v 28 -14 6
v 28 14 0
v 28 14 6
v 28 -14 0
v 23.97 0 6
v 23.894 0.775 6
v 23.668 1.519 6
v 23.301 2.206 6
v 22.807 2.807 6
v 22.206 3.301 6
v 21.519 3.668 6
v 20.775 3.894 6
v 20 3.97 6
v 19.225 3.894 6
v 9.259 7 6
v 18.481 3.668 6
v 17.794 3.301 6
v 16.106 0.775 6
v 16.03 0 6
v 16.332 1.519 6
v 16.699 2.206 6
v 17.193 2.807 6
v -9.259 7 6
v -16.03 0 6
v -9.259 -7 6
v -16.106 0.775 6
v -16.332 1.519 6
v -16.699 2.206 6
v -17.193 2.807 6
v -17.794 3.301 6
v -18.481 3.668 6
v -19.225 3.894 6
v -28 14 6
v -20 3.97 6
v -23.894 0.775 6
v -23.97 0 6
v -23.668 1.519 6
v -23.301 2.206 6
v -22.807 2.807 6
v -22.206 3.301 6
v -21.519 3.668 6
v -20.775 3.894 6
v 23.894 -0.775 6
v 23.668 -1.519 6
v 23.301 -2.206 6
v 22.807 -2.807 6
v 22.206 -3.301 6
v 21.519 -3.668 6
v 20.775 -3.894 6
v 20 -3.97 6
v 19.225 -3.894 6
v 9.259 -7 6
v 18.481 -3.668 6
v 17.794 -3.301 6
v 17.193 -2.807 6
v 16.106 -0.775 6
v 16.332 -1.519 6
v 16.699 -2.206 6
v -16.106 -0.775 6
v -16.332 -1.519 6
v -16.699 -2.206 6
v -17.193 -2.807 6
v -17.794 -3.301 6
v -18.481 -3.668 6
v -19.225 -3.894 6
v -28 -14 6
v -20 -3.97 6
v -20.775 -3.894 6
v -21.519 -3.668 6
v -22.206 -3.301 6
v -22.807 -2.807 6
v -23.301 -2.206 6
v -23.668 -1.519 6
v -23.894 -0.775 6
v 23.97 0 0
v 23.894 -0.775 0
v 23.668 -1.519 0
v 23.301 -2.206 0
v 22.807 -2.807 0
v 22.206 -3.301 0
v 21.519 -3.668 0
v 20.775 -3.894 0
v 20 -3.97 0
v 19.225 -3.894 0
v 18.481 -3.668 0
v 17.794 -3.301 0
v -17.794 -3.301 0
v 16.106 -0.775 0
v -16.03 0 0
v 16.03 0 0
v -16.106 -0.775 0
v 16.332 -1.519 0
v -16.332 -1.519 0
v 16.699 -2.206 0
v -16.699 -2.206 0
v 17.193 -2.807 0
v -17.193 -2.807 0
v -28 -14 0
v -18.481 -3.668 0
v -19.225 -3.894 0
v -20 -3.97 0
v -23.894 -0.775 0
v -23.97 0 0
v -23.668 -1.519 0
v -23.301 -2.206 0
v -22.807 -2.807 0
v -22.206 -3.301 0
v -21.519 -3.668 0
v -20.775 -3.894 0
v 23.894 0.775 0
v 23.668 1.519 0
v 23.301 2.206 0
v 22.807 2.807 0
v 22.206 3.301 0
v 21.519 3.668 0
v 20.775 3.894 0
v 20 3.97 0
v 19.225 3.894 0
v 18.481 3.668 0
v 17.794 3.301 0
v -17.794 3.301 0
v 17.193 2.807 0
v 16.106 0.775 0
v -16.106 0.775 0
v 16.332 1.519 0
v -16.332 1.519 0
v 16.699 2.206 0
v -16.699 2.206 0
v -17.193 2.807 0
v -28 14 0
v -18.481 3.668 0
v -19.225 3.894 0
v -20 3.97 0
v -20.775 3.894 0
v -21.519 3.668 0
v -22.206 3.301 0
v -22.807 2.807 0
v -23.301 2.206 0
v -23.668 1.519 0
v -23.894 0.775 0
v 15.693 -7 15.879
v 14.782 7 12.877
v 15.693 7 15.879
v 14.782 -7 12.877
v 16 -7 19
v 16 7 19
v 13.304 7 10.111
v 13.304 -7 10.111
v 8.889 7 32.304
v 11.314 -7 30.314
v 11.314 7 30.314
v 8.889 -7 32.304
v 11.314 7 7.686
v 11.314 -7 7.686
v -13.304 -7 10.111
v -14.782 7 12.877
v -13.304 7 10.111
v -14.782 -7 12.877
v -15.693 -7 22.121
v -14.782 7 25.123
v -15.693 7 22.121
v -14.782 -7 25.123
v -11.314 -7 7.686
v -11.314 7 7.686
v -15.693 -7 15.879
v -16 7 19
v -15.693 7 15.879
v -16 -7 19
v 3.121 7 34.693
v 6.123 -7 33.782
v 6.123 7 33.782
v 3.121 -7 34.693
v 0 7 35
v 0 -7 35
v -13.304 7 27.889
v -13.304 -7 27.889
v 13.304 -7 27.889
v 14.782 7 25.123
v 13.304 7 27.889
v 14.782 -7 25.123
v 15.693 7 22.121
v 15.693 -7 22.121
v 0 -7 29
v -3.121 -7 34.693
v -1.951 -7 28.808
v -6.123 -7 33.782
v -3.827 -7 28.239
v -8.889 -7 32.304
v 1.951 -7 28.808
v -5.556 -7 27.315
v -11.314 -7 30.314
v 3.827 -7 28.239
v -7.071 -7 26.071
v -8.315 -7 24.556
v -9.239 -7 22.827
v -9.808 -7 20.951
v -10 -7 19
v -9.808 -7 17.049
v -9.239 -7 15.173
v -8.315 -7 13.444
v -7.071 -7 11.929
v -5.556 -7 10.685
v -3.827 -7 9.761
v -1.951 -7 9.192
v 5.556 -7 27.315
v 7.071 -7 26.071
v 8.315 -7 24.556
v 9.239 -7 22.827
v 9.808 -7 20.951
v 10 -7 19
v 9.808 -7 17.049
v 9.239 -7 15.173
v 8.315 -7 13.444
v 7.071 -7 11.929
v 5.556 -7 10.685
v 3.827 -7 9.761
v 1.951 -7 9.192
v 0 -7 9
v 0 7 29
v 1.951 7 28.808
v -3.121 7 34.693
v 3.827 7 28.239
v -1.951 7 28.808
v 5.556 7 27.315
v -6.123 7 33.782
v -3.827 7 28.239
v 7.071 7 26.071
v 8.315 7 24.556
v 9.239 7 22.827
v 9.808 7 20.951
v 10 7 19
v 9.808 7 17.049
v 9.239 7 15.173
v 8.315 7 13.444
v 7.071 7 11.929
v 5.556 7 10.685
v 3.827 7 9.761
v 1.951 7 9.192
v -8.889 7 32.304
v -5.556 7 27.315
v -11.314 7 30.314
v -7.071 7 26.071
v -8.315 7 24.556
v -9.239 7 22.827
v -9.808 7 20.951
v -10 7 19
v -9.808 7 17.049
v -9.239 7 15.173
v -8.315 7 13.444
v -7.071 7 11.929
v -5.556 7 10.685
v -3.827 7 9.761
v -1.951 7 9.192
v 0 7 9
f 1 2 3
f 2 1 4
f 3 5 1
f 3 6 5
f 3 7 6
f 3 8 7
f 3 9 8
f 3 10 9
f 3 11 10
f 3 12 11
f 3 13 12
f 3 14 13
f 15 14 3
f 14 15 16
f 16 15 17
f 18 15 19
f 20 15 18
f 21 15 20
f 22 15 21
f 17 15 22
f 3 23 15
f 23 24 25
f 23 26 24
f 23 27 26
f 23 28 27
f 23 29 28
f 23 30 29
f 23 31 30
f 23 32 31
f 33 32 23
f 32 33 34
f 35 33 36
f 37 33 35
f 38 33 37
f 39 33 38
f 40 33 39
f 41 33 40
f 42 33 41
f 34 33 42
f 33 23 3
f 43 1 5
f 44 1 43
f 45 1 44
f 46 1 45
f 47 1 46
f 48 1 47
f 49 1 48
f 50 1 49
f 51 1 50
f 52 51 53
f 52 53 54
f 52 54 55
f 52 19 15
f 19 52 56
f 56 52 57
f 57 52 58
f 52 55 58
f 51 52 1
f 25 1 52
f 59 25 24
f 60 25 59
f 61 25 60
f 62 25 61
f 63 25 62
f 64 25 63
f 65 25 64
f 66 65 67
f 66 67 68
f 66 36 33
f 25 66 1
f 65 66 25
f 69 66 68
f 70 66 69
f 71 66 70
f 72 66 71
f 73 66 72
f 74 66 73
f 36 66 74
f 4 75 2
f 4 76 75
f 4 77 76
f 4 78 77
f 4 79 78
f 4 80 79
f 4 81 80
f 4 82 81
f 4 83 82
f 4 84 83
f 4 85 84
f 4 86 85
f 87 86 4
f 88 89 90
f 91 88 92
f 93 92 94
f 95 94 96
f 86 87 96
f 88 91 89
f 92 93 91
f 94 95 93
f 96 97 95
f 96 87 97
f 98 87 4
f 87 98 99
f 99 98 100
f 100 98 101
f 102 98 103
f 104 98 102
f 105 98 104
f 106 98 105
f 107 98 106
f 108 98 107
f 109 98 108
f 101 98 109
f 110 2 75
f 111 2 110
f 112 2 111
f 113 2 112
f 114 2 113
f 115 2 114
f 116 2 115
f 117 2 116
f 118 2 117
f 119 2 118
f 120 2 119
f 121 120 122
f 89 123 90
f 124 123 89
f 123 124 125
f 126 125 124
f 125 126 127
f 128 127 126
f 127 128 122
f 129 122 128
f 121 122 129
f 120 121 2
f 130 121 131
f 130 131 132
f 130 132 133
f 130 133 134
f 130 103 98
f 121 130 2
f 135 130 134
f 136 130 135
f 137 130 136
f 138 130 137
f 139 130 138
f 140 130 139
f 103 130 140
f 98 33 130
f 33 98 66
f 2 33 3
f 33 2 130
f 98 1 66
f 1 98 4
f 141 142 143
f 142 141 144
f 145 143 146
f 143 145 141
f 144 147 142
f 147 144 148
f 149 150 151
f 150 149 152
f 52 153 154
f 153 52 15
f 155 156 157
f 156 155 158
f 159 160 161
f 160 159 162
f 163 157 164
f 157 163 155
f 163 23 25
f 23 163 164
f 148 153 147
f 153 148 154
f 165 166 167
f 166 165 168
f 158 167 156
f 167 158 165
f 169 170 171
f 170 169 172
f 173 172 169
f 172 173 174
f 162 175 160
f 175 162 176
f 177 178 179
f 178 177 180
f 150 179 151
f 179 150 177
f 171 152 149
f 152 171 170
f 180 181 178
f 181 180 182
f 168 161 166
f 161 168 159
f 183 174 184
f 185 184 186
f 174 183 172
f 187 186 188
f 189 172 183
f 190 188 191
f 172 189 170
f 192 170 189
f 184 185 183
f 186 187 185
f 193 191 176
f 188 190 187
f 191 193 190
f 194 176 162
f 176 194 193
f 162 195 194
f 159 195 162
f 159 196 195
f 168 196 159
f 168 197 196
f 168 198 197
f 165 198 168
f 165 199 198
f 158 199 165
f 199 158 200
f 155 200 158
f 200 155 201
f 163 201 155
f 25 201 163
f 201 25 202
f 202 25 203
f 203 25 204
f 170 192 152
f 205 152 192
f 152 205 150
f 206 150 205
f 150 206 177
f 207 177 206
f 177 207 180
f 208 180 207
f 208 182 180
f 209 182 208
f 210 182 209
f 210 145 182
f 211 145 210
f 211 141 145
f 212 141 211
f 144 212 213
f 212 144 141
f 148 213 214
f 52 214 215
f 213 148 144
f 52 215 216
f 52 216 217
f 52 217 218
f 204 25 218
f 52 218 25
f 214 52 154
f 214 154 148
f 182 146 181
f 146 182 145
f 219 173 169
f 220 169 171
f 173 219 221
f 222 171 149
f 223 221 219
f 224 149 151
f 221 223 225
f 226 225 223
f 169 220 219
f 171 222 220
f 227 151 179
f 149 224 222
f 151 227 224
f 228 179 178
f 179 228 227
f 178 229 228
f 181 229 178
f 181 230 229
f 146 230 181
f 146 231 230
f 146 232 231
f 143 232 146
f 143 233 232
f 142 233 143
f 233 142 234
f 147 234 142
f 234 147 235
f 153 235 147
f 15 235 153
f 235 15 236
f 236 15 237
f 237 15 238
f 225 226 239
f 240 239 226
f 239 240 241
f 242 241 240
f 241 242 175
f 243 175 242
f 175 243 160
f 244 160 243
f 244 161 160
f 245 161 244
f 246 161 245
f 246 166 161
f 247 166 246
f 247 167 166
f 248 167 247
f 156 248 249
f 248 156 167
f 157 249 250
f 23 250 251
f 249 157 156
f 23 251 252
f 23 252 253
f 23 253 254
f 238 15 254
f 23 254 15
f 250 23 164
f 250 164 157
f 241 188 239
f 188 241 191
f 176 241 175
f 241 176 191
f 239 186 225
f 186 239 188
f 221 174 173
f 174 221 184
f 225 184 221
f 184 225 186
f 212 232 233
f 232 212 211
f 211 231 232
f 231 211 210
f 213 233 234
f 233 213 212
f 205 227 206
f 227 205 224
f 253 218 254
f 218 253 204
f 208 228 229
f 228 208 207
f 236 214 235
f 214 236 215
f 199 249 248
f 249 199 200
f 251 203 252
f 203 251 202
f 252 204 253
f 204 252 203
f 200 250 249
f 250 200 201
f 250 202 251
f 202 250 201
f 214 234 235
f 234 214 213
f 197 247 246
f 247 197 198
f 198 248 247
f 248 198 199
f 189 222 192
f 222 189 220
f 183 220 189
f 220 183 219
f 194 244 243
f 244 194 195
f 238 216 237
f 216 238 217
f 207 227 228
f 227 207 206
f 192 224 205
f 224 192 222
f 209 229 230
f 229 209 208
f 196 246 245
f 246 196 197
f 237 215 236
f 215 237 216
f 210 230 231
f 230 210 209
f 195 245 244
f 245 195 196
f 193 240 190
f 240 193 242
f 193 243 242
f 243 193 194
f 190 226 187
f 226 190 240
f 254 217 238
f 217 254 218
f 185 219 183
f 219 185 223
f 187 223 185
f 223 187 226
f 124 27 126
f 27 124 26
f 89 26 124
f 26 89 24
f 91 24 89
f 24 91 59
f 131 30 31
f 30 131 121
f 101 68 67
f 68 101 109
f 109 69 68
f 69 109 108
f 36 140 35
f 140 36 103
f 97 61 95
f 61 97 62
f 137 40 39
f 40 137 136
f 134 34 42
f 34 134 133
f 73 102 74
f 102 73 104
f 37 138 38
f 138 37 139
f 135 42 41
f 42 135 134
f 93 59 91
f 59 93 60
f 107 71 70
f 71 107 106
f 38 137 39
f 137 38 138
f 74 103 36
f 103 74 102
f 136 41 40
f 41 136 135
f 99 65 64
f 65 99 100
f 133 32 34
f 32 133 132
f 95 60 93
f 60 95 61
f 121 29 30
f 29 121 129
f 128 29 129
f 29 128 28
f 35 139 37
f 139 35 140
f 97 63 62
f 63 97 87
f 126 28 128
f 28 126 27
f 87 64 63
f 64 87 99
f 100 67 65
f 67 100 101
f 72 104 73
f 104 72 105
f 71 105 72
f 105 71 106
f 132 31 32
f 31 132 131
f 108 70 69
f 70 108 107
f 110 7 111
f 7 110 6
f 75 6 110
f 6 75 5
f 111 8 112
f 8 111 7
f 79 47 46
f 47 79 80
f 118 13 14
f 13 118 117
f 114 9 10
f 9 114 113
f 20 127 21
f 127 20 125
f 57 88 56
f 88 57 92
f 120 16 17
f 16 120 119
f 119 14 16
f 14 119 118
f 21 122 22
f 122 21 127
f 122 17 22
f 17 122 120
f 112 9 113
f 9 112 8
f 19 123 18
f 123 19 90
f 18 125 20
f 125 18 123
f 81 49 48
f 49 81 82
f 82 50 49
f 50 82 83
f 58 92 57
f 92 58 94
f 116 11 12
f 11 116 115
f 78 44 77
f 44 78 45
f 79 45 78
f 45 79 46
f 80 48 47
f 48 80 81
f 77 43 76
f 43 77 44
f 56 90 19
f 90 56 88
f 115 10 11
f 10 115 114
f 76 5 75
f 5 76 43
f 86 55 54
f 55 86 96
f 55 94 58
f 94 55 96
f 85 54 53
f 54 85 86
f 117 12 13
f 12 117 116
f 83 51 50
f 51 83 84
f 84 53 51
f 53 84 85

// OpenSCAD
$fn = 32;

// ----------------------------------------------------------------------
// Deck eye: 32 mm eye on a 56 mm base
// ----------------------------------------------------------------------

// --- parameters (mm) ---
base_l = 56;              // base length
base_w = 28;              // base width
base_t = 6;               // base thickness
eye_r = 16;               // eye outside radius
eye_bore = 20;            // eye bore diameter
eye_w = 14;               // eye thickness
eye_z = 19;               // eye centre height
holes_d = 7.94;           // fixing holes
hole_x = 20;              // fixing hole spacing

difference() {
  union() {
    translate([-28, -14, 0]) cube([base_l, base_w, base_t]);
    /* eye standing upright, its foot sunk 3 mm into the base */
    translate([0, -7, 19]) rotate([-90, 0, 0]) cylinder(h = 14, d = 32);
  }
  /* eye bore, 2.5 mm clear of both faces */
  translate([0, -9.5, 19]) rotate([-90, 0, 0]) cylinder(h = 19, d = 20);
  translate([-20, 0, -2.5]) cylinder(h = base_t + 5, d = holes_d);
  translate([20, 0, -2.5]) cylinder(h = base_t + 5, d = holes_d);
}
